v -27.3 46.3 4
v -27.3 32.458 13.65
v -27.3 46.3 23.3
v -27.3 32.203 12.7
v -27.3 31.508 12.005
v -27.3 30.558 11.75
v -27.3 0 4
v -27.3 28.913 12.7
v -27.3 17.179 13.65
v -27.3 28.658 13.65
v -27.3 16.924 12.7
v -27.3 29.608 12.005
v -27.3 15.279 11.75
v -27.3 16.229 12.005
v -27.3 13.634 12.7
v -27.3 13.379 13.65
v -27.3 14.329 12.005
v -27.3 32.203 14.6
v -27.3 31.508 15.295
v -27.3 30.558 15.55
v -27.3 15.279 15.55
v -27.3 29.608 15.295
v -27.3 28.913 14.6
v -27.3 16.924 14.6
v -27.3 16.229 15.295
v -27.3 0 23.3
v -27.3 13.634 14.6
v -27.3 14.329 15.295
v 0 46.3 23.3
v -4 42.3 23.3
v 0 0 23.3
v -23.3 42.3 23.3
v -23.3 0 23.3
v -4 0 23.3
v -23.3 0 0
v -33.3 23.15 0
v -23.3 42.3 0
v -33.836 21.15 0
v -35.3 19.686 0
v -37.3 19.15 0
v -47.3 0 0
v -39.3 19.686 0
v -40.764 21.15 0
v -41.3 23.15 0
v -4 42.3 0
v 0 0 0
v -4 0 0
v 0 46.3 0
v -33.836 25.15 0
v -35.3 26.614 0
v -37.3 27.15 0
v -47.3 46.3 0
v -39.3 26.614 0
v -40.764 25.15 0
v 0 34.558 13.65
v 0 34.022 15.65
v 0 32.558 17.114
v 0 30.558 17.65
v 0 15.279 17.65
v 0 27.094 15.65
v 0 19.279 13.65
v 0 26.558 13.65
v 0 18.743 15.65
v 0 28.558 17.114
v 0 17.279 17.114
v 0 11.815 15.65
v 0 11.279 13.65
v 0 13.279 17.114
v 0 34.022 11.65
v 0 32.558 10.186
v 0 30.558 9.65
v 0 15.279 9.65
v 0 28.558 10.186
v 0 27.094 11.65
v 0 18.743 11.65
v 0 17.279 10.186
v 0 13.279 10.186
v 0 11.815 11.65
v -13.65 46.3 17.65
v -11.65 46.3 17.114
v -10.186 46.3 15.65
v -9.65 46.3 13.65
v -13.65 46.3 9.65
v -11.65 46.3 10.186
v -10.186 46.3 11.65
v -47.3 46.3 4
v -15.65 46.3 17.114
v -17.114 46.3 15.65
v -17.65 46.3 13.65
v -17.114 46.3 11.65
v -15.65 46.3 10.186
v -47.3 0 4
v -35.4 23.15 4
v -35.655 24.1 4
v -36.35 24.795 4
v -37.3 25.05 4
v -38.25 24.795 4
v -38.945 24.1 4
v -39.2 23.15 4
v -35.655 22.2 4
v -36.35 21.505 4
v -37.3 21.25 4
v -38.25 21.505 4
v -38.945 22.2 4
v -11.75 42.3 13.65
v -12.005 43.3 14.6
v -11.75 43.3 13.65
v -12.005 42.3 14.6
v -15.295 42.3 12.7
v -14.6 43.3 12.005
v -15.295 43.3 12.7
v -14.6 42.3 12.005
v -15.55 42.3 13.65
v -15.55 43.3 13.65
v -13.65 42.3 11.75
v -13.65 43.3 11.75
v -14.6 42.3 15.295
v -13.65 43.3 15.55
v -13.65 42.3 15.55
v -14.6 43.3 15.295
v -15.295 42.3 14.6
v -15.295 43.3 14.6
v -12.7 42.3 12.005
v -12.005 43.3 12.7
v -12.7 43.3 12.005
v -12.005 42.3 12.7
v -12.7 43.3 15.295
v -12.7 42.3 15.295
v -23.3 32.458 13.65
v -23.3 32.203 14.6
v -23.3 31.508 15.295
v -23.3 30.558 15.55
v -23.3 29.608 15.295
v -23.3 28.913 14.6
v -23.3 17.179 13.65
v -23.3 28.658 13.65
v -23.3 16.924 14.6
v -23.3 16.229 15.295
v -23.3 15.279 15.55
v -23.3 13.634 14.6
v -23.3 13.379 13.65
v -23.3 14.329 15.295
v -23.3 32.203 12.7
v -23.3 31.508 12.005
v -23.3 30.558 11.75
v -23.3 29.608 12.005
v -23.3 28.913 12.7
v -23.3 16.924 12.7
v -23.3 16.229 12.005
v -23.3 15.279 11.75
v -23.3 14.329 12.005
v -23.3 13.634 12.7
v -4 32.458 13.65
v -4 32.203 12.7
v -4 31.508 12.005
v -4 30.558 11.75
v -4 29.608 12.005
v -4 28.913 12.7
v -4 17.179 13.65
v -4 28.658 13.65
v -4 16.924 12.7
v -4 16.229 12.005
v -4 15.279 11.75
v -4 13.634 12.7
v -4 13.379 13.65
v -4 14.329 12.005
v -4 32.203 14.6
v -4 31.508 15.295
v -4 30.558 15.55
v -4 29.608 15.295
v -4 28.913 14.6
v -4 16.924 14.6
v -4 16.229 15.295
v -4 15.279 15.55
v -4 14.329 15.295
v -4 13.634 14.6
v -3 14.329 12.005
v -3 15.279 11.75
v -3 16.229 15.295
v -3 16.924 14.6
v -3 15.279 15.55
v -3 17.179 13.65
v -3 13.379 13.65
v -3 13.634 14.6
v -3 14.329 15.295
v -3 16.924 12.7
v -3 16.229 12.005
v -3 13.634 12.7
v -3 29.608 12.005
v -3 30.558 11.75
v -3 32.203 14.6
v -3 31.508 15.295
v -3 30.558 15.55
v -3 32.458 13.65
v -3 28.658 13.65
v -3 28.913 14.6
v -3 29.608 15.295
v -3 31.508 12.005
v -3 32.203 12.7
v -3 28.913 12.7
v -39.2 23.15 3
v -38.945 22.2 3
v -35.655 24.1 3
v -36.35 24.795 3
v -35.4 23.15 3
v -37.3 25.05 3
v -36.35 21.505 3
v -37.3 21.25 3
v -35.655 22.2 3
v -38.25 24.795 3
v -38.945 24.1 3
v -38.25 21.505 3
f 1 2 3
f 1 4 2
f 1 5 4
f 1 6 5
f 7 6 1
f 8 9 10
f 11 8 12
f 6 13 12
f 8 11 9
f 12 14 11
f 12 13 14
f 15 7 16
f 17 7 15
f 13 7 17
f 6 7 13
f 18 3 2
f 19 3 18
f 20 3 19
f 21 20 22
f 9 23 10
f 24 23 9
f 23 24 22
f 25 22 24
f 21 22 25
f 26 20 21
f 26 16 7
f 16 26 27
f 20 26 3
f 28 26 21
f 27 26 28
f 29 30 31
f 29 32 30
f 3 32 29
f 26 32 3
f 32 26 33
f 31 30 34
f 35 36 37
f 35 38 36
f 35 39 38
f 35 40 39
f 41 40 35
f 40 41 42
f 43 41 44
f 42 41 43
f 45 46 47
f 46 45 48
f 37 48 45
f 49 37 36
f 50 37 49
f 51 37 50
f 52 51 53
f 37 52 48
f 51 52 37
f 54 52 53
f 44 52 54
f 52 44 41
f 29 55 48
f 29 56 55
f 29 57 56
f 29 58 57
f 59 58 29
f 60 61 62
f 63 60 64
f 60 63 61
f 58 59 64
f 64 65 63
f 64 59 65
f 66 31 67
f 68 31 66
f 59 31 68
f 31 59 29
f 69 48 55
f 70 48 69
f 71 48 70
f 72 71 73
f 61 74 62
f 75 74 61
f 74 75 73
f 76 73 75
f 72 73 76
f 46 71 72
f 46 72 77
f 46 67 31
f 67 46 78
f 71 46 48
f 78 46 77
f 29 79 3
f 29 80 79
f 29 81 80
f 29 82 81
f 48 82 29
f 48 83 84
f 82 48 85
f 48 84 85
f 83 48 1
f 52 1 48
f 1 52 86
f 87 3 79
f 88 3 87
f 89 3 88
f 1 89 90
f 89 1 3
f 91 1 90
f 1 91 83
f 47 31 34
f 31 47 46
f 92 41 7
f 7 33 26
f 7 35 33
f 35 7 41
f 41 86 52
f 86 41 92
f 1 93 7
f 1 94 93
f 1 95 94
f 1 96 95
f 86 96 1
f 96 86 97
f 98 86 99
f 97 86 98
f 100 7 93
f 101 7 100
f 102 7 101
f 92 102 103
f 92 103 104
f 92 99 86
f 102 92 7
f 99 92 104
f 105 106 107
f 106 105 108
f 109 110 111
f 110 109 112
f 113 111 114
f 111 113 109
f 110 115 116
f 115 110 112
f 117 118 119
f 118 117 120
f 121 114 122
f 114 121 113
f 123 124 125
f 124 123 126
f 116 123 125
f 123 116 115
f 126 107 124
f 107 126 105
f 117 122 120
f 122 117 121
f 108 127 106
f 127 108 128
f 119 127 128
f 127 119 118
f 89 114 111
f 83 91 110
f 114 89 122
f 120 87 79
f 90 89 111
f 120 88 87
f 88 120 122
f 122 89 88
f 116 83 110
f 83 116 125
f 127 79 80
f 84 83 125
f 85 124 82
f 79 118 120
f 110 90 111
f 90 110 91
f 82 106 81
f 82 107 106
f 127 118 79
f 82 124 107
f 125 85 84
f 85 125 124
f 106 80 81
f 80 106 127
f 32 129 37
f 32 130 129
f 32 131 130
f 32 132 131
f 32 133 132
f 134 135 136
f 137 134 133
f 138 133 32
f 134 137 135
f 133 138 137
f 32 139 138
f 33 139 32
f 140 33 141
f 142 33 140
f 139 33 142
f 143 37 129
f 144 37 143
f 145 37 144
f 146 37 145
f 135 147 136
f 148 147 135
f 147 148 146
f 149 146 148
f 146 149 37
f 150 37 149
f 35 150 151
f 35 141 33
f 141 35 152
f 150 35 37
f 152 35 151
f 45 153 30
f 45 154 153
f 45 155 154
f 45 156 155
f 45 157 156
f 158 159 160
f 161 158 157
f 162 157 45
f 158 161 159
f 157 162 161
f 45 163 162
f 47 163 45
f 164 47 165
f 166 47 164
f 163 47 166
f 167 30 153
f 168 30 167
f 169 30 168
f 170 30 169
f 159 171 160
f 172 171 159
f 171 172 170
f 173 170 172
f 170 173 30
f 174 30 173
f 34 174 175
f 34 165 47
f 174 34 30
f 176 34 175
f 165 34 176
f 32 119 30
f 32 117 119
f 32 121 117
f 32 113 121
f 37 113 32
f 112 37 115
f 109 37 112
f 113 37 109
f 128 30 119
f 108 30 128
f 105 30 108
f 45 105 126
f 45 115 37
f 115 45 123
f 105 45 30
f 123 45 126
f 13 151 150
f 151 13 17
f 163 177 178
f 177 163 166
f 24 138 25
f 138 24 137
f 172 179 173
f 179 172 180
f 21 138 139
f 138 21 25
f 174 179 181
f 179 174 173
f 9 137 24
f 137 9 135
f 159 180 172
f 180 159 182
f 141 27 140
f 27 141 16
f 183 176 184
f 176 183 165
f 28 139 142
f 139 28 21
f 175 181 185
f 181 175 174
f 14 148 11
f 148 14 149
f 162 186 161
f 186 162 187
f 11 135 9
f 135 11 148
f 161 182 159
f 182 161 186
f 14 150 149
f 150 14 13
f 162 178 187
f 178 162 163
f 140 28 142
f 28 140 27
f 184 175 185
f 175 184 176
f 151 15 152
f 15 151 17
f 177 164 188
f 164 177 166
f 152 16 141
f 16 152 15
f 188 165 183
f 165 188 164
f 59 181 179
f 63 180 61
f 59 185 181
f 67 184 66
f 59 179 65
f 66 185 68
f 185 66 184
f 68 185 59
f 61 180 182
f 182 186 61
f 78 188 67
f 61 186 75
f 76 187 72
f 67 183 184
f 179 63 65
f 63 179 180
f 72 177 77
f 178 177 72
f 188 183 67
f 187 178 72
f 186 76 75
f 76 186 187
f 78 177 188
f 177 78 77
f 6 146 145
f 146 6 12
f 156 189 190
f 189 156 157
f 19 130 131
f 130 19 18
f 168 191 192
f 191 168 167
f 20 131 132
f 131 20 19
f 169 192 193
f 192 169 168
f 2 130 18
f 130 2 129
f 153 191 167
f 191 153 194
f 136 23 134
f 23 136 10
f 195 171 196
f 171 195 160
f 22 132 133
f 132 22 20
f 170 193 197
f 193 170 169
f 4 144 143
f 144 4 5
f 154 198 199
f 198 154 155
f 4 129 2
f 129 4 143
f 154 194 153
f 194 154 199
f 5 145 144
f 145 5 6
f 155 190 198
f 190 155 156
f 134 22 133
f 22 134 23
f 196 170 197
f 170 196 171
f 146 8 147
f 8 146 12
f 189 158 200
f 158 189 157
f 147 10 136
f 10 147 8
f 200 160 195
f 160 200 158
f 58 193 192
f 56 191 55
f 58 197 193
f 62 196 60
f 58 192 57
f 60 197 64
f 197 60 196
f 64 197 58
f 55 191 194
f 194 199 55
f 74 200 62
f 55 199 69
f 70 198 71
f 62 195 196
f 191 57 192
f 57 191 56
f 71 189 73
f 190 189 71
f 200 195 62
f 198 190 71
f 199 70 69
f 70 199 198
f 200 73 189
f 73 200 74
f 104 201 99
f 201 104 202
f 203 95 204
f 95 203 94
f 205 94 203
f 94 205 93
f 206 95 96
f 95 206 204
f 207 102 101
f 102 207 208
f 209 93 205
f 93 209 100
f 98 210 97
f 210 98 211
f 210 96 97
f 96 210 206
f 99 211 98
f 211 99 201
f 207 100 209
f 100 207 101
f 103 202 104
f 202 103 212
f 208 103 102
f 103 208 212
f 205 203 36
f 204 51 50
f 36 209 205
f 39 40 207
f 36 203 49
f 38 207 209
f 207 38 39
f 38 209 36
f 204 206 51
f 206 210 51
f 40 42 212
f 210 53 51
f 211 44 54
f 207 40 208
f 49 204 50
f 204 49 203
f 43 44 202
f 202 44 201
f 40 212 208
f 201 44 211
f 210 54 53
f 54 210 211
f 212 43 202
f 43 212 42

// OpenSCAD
difference(){
	scale(v = [-1, 1, 1]) {
		union() {
			translate(v = [0, 0, 0]) {
				cube(size = [27.3000000000, 46.3000000000, 23.3000000000]);
			}
			translate(v = [27.3000000000, 0, 0]) {
				cube(size = [20, 46.3000000000, 4]);
			}
		}
	}
	/* Holes Below*/
	scale(v = [-1, 1, 1]){
		union(){
			translate(v = [0, 0, 0]){
				translate(v = [4, -1, 0]) {
					cube(size = [19.3000000000, 43.3000000000, 28.3000000000]);
				}
				translate(v = [13.6500000000, 46.3000000000, 13.6500000000]) {
					rotate(a = -90, v = [1, 0, 0]) {
						union() {
							union() {
								translate(v = [0, 0, -5]) {
									cylinder($fn = 12, h = 5, r = 1.9000000000);
								}
								translate(v = [0, 0, -3]) {
									cylinder($fn = 12, h = 3, r1 = 1.9000000000, r2 = 4);
								}
							}
							cylinder($fn = 12, h = 1, r = 4);
						}
					}
				}
			}
			translate(v = [0, 15.2790000000, 13.6500000000]) {
				rotate(a = -90, v = [0, 1, 0]) {
					union() {
						union() {
							translate(v = [0, 0, -28.3000000000]) {
								cylinder($fn = 12, h = 28.3000000000, r = 1.9000000000);
							}
							translate(v = [0, 0, -3]) {
								cylinder($fn = 12, h = 3, r1 = 1.9000000000, r2 = 4);
							}
						}
						cylinder($fn = 12, h = 1, r = 4);
					}
				}
			}
			translate(v = [0, 30.5580000000, 13.6500000000]) {
				rotate(a = -90, v = [0, 1, 0]) {
					union() {
						union() {
							translate(v = [0, 0, -28.3000000000]) {
								cylinder($fn = 12, h = 28.3000000000, r = 1.9000000000);
							}
							translate(v = [0, 0, -3]) {
								cylinder($fn = 12, h = 3, r1 = 1.9000000000, r2 = 4);
							}
						}
						cylinder($fn = 12, h = 1, r = 4);
					}
				}
			}
			translate(v = [37.3000000000, 23.1500000000, 0]) {
				rotate(a = 180, v = [0, 1, 0]) {
					union() {
						union() {
							translate(v = [0, 0, -5]) {
								cylinder($fn = 12, h = 5, r = 1.9000000000);
							}
							translate(v = [0, 0, -3]) {
								cylinder($fn = 12, h = 3, r1 = 1.9000000000, r2 = 4);
							}
						}
						cylinder($fn = 12, h = 1, r = 4);
					}
				}
			}
		}
	} /* End Holes */ 
}
